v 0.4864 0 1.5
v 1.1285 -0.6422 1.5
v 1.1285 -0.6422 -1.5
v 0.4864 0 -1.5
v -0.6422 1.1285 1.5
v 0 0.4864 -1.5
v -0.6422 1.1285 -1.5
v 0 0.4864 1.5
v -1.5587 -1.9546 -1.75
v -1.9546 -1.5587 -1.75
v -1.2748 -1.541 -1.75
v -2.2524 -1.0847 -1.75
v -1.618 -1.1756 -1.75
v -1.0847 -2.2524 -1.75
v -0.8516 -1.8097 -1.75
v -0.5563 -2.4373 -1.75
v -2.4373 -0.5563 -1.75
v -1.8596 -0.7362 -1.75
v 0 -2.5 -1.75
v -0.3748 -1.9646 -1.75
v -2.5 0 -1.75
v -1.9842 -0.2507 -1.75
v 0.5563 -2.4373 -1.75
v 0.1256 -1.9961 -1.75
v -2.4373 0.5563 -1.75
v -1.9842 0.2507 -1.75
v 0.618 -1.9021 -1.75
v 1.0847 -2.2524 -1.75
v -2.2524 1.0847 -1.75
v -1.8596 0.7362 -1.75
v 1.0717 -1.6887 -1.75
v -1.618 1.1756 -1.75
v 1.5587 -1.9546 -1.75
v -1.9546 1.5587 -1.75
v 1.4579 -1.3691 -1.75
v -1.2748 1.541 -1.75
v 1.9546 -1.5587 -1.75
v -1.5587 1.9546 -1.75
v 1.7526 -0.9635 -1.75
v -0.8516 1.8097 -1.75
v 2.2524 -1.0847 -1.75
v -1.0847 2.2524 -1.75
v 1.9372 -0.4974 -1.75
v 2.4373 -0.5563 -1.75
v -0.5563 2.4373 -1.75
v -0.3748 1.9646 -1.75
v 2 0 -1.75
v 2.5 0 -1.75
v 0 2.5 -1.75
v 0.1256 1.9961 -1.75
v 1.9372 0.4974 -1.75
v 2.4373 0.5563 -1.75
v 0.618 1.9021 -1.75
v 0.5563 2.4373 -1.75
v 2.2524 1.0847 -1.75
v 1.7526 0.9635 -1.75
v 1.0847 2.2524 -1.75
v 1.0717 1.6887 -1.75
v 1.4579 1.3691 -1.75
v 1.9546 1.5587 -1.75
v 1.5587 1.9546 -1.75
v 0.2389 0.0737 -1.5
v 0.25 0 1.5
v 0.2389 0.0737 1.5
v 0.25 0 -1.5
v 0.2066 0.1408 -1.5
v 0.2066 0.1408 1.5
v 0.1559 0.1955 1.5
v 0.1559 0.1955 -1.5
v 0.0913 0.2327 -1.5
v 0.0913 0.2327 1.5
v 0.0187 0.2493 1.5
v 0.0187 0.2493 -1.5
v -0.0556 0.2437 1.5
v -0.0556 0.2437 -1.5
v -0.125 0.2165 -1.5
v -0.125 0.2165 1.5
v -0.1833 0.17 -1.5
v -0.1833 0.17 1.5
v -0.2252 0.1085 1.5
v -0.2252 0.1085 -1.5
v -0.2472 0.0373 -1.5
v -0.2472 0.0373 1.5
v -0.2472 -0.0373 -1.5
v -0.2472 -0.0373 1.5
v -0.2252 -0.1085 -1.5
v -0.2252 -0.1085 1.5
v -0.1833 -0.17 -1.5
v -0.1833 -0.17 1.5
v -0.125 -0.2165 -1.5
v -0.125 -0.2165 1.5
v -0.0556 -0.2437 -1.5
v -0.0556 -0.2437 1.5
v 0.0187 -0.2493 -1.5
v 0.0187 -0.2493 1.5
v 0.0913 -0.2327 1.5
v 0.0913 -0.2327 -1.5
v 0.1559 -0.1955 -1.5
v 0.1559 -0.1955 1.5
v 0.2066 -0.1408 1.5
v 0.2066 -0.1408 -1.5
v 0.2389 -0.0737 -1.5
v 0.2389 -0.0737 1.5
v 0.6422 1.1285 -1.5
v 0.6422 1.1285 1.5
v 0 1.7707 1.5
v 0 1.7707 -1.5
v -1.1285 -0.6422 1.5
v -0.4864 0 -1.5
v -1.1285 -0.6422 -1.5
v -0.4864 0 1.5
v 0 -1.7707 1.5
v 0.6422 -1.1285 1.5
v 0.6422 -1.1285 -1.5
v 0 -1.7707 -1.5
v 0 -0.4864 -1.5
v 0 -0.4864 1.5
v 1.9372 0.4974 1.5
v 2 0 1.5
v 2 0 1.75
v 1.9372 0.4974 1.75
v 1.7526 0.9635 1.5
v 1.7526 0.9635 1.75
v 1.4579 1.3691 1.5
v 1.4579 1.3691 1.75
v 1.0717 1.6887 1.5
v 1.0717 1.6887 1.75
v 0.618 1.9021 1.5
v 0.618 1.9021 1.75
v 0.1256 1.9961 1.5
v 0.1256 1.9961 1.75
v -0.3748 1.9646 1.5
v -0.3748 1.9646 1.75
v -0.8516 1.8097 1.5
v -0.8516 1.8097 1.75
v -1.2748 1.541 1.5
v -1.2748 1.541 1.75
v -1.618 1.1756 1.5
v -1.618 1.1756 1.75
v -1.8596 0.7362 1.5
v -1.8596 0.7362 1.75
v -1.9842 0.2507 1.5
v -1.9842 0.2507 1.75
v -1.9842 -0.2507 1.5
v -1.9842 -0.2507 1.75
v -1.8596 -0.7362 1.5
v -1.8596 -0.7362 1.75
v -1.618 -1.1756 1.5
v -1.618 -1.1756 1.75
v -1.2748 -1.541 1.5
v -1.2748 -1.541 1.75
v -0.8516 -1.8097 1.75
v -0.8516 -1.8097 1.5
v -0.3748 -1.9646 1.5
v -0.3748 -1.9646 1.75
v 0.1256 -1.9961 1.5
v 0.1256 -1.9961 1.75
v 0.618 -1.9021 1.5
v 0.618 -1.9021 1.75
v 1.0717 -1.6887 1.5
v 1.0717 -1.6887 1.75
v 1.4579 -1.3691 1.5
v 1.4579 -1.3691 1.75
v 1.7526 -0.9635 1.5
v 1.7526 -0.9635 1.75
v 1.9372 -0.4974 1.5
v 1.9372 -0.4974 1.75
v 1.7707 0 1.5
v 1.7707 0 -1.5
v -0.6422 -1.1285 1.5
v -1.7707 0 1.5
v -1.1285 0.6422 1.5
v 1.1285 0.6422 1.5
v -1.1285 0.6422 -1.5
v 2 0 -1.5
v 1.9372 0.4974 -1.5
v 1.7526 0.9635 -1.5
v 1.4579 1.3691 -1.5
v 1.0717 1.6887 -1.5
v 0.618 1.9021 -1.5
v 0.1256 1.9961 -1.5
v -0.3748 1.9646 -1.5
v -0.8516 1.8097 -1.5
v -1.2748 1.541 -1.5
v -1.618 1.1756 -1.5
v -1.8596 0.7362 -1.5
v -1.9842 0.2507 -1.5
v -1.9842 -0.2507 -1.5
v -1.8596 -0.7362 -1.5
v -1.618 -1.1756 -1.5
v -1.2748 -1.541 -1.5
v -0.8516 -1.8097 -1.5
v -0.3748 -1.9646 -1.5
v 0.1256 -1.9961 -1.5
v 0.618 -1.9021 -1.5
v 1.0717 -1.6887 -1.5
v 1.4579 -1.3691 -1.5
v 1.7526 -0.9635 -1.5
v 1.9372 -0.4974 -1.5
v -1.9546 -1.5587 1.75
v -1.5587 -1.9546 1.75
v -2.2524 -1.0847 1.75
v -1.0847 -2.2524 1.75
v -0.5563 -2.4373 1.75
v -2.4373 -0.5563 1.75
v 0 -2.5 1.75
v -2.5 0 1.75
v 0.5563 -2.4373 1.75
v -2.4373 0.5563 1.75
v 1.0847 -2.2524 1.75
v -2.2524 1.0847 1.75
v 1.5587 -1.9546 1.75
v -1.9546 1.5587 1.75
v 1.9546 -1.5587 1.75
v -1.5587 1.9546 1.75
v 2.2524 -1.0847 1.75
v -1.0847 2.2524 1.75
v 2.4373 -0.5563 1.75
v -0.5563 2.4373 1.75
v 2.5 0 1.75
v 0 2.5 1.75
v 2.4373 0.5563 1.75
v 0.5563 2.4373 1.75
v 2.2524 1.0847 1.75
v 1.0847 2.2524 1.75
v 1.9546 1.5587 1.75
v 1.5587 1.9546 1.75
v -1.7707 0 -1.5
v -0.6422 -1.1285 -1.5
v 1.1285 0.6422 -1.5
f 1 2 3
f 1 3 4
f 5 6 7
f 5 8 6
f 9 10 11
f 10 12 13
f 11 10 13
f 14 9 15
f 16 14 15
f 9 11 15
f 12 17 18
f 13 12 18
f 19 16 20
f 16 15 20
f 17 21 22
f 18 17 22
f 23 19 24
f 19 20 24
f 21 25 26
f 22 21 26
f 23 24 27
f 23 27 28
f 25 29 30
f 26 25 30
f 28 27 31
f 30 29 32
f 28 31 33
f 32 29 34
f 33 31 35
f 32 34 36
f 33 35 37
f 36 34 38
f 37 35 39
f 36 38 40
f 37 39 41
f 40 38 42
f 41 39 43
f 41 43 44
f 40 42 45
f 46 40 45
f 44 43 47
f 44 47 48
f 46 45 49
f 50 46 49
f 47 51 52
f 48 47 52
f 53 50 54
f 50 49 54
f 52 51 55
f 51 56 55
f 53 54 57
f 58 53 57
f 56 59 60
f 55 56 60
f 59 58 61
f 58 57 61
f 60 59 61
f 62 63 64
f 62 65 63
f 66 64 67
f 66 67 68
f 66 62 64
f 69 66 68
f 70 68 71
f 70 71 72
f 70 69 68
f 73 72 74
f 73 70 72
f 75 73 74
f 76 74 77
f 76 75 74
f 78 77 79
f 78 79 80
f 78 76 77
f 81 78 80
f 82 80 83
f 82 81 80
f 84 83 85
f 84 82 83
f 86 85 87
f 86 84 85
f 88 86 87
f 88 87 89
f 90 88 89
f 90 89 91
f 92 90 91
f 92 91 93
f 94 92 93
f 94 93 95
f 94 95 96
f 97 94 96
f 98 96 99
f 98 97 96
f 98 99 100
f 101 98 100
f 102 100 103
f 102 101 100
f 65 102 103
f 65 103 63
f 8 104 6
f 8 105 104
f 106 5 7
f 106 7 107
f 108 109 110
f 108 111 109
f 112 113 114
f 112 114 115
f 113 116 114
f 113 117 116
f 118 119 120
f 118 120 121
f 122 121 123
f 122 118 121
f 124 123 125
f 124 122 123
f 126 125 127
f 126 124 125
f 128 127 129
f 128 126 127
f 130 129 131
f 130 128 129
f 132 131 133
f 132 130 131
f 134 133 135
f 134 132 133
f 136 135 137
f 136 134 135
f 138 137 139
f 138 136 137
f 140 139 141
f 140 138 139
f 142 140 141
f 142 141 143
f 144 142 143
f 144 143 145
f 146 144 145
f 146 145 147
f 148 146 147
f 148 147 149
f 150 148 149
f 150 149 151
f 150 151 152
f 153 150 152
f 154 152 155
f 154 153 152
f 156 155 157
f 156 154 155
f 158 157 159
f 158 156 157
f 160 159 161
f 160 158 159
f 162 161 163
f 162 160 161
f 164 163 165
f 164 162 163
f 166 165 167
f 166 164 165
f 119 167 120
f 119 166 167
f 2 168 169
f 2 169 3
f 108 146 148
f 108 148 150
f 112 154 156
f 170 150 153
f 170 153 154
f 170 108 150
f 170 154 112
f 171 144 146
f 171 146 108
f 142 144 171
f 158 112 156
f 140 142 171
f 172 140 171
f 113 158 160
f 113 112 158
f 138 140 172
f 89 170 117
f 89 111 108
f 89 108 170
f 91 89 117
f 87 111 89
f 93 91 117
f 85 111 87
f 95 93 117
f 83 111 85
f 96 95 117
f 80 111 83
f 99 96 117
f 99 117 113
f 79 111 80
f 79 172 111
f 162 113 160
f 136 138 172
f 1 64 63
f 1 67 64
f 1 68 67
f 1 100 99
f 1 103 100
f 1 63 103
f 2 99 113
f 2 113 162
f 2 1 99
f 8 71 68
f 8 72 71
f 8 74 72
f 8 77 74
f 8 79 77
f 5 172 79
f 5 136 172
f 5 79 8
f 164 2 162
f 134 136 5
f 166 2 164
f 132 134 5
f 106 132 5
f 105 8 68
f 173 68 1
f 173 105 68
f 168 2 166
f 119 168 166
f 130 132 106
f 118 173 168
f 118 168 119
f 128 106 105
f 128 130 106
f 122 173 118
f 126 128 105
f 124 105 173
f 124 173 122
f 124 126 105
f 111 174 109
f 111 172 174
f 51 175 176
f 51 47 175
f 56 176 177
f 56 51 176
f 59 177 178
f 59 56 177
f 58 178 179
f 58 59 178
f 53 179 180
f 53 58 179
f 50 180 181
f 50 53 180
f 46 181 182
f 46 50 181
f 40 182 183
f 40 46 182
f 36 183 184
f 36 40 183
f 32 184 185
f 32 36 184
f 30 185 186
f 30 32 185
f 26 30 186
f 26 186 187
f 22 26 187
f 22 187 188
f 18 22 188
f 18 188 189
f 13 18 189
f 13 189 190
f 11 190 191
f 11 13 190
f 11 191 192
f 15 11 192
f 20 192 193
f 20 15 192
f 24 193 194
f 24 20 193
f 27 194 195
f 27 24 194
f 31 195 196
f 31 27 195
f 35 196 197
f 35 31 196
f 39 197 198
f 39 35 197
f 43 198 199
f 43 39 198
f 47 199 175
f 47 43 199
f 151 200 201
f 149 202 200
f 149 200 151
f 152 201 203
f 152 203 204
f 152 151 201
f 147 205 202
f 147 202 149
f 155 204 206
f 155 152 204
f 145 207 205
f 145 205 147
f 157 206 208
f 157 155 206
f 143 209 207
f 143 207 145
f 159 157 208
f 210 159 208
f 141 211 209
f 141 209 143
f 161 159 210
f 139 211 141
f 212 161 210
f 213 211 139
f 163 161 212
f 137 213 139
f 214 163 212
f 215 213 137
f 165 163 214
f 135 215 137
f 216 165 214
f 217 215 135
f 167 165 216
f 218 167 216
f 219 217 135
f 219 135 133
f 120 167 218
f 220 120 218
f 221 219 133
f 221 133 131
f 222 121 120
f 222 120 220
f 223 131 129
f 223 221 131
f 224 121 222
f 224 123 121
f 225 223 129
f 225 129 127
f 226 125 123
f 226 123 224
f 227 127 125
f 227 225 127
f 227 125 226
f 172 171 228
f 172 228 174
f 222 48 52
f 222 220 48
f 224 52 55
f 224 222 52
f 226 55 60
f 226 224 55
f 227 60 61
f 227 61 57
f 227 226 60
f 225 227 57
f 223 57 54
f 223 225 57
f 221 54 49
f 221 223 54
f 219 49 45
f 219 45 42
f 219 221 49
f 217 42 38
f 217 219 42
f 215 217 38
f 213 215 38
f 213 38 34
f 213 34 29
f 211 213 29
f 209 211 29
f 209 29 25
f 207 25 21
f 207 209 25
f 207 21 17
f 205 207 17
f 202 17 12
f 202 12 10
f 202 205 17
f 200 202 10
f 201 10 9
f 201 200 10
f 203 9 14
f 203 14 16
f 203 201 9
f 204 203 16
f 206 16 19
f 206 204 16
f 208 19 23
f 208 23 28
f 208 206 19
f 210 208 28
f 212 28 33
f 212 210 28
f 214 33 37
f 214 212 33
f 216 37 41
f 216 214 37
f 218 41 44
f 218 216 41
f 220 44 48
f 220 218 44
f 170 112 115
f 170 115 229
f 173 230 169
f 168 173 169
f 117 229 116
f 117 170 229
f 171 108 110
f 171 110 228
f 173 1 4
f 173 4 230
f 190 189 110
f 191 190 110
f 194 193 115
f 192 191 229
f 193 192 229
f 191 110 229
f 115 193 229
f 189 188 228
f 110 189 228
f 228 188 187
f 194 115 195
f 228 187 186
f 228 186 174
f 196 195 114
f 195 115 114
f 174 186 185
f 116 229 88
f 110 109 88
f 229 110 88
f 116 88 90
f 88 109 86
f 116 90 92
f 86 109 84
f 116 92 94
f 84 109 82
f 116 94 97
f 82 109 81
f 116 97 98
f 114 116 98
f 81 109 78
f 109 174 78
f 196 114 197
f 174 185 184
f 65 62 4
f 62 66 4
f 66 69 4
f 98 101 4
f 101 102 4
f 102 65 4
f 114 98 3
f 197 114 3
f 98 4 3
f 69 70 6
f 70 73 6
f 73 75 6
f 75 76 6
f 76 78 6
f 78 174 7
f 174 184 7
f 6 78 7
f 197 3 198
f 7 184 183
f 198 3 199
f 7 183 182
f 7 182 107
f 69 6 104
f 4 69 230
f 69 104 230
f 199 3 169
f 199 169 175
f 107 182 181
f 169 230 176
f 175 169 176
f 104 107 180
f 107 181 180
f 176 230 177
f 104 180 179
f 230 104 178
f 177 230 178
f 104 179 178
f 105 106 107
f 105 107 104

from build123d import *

# Parameters (mm, degrees)
F0_R     = 2
F0_R_2   = 0.25
F1_DEPTH = 1.5
F0_R_3   = 2.5
F2_DEPTH = 1.75


with BuildPart() as f1:
    # F0 (on Top) → F1 (new body, symmetric)
    with BuildSketch(Plane.XY):
        Circle(F0_R)
        Polygon((0.642193, -1.128549), (0, -1.770742), (-0.642193, -1.128549), (0, -0.486356), align=None, mode=Mode.SUBTRACT)
        Polygon((-1.128549, -0.642193), (-1.770742, 0), (-1.128549, 0.642193), (-0.486356, 0), align=None, mode=Mode.SUBTRACT)
        Polygon((-0.642193, 1.128549), (0, 1.770742), (0.642193, 1.128549), (0, 0.486356), align=None, mode=Mode.SUBTRACT)
        Circle(F0_R_2, mode=Mode.SUBTRACT)
        Polygon((1.128549, 0.642193), (1.770742, 0), (1.128549, -0.642193), (0.486356, 0), align=None, mode=Mode.SUBTRACT)
    extrude(amount=F1_DEPTH, both=True)

    # F0 (on Top) → F2 (join, symmetric)
    with BuildSketch(Plane.XY):
        Circle(F0_R_3)
        Circle(F0_R, mode=Mode.SUBTRACT)
    extrude(amount=F2_DEPTH, both=True)


solid = f1.part
